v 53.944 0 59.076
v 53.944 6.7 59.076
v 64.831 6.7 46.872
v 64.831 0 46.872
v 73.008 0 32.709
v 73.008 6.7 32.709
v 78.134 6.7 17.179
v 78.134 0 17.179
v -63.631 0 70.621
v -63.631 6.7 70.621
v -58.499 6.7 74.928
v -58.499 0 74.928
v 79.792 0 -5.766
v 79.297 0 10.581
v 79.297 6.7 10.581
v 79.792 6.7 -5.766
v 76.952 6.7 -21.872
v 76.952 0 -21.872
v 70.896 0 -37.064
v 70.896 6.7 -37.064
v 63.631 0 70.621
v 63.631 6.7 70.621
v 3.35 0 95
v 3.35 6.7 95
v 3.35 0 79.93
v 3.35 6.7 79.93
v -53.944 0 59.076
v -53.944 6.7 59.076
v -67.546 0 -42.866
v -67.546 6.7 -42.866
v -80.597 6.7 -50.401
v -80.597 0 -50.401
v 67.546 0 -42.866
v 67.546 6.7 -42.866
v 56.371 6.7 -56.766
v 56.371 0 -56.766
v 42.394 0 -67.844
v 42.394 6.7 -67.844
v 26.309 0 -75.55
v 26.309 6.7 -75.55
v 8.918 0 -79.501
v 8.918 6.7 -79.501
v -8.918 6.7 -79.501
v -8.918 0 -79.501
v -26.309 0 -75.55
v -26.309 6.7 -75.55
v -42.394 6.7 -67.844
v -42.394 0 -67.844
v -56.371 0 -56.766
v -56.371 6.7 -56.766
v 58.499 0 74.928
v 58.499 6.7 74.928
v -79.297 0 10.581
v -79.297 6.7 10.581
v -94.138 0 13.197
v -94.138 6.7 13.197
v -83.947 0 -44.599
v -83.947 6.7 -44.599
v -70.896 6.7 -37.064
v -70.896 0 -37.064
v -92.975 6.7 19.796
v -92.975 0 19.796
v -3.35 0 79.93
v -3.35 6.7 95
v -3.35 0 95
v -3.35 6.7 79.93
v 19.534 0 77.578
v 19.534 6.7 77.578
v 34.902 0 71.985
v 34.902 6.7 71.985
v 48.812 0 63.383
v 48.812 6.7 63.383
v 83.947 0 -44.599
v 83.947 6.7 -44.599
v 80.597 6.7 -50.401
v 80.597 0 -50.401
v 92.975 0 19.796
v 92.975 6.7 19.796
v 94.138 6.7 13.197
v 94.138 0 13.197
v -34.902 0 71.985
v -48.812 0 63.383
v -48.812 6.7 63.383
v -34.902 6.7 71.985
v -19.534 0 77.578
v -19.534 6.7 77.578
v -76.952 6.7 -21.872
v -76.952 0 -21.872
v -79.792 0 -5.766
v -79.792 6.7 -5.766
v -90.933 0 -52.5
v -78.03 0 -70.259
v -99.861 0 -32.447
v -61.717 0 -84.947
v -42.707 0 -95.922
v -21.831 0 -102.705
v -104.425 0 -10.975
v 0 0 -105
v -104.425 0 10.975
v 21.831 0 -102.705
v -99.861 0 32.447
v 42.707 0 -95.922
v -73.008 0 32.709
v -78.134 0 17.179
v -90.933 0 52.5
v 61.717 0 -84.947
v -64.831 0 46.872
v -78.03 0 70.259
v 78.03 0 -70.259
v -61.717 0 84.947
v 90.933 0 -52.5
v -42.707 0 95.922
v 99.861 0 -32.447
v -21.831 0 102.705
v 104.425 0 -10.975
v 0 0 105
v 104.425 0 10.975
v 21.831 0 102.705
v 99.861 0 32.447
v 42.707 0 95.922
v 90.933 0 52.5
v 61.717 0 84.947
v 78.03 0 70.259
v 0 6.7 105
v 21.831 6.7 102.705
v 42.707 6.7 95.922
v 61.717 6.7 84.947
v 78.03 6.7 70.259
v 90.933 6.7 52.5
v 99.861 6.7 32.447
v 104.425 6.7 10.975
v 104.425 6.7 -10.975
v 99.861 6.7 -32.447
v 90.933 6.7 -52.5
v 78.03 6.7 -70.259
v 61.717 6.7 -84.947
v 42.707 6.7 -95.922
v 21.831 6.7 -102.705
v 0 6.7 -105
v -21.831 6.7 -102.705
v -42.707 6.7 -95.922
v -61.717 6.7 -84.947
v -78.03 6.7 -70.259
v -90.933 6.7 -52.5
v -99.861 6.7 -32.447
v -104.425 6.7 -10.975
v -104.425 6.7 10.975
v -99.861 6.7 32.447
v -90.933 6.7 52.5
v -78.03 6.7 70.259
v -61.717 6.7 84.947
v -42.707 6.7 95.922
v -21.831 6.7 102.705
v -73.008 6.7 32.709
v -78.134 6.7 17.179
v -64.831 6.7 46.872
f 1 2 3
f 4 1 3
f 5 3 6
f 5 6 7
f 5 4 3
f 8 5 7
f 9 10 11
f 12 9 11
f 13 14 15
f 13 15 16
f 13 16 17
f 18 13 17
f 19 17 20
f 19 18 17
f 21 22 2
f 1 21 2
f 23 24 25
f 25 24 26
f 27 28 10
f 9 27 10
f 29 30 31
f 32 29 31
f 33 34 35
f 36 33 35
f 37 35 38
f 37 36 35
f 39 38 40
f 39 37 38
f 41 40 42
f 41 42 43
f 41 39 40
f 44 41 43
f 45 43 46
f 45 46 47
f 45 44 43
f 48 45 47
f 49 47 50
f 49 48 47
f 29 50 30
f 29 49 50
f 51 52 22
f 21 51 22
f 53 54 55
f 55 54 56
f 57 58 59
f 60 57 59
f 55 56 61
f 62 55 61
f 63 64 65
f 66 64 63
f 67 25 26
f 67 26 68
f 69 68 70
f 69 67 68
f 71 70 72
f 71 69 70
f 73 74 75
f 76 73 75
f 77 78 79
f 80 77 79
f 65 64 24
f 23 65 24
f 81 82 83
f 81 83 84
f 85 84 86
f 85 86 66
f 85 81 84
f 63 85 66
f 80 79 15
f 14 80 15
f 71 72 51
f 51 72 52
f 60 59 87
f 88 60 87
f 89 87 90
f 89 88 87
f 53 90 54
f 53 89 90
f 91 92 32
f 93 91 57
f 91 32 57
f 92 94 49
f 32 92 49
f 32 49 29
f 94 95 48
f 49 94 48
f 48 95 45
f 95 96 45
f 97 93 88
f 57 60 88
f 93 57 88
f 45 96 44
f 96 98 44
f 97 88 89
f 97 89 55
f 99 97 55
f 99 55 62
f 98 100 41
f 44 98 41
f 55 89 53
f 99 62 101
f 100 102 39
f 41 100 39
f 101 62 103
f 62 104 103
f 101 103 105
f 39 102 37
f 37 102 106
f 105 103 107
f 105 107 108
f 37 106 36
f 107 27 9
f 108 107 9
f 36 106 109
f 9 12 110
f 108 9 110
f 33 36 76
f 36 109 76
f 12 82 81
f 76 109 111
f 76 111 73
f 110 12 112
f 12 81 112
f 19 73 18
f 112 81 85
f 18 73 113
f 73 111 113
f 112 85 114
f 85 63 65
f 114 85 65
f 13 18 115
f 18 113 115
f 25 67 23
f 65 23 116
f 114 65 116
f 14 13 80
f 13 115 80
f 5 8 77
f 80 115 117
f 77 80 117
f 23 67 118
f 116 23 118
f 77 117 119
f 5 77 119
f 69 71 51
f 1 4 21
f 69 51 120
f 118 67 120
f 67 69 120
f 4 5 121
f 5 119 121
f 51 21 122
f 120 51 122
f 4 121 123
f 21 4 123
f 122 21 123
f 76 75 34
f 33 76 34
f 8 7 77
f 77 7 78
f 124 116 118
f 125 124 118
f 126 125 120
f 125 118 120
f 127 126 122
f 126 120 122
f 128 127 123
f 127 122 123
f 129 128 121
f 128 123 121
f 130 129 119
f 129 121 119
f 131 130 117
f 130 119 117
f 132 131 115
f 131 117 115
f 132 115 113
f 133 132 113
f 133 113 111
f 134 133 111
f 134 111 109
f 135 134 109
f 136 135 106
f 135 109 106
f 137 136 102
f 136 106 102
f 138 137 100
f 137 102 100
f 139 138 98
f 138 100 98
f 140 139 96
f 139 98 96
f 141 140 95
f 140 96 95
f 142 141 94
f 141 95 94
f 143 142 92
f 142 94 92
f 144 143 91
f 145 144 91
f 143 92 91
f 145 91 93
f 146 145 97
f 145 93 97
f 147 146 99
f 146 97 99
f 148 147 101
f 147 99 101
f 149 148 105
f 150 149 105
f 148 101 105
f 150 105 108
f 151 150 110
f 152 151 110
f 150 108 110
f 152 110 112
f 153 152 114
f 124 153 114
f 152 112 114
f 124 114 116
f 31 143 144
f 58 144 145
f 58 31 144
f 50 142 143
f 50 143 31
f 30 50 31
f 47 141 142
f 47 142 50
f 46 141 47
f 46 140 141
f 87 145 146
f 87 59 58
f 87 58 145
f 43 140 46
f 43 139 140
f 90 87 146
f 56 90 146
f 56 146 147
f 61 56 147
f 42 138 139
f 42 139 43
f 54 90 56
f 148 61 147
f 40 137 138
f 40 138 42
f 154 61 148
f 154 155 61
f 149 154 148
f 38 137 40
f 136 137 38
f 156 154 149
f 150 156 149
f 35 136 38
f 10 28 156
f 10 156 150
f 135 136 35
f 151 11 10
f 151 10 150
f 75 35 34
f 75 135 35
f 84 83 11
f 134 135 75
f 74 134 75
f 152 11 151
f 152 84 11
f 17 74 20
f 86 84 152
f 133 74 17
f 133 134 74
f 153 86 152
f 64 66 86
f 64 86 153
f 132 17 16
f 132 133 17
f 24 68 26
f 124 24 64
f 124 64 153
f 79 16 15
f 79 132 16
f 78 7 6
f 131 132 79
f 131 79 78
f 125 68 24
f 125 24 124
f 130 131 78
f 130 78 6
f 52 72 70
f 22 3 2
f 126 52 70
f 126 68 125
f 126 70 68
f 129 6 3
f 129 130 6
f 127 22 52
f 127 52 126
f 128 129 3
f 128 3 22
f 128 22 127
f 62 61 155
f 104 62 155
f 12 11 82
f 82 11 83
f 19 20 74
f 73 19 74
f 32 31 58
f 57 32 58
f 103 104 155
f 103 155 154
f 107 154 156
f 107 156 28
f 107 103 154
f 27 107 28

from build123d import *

# Parameters (mm, degrees)
SKETCH1_R           = 105
SKETCH1_R_2         = 80
BOSS_EXTRUDE1_DEPTH = 6.7
SKETCH2_W           = 6.7
SKETCH2_H           = 20
CUT_EXTRUDE3_DEPTH  = 6.7


with BuildPart() as part:
    # Sketch1 → Boss-Extrude1 (new body)
    with BuildSketch(Plane(origin=(0, 0, 0), x_dir=(1, 0, 0), z_dir=(0, 1, 0))):
        with Locations(Location((0, 0, 0), (0, 0, 270))):
            Circle(SKETCH1_R)
        with Locations(Location((0, 0, 0), (0, 0, 270))):
            Circle(SKETCH1_R_2, mode=Mode.SUBTRACT)
    extrude(amount=BOSS_EXTRUDE1_DEPTH)

    # Sketch2 → Cut-Extrude3 (cut)
    with BuildSketch(Plane(origin=(0, 6.7, 0), x_dir=(1, 0, 0), z_dir=(0, 1, 0))):
        Polygon((80.59741336, 50.401185103), (63.276905284, 40.401185103), (66.626905284, 34.598814897), (83.94741336, 44.598814897), align=None)
        Polygon((63.631071805, -70.620883604), (50.775319611, -55.299994741), (45.642821842, -59.606671726), (58.498574036, -74.927560589), align=None)
        Polygon((94.138457931, -13.197470906), (74.442302871, -9.724507352), (73.278860081, -16.322719298), (92.975015141, -19.795682851), align=None)
        with Locations((0, -85)):
            Rectangle(SKETCH2_W, SKETCH2_H)
        Polygon((-58.498574036, -74.927560589), (-45.642821842, -59.606671726), (-50.775319611, -55.299994741), (-63.631071805, -70.620883604), align=None)
        Polygon((-92.975015141, -19.795682851), (-73.278860081, -16.322719298), (-74.442302871, -9.724507352), (-94.138457931, -13.197470906), align=None)
        Polygon((-83.94741336, 44.598814897), (-66.626905284, 34.598814897), (-63.276905284, 40.401185103), (-80.59741336, 50.401185103), align=None)
    extrude(amount=-CUT_EXTRUDE3_DEPTH, mode=Mode.SUBTRACT)


solid = part.part
